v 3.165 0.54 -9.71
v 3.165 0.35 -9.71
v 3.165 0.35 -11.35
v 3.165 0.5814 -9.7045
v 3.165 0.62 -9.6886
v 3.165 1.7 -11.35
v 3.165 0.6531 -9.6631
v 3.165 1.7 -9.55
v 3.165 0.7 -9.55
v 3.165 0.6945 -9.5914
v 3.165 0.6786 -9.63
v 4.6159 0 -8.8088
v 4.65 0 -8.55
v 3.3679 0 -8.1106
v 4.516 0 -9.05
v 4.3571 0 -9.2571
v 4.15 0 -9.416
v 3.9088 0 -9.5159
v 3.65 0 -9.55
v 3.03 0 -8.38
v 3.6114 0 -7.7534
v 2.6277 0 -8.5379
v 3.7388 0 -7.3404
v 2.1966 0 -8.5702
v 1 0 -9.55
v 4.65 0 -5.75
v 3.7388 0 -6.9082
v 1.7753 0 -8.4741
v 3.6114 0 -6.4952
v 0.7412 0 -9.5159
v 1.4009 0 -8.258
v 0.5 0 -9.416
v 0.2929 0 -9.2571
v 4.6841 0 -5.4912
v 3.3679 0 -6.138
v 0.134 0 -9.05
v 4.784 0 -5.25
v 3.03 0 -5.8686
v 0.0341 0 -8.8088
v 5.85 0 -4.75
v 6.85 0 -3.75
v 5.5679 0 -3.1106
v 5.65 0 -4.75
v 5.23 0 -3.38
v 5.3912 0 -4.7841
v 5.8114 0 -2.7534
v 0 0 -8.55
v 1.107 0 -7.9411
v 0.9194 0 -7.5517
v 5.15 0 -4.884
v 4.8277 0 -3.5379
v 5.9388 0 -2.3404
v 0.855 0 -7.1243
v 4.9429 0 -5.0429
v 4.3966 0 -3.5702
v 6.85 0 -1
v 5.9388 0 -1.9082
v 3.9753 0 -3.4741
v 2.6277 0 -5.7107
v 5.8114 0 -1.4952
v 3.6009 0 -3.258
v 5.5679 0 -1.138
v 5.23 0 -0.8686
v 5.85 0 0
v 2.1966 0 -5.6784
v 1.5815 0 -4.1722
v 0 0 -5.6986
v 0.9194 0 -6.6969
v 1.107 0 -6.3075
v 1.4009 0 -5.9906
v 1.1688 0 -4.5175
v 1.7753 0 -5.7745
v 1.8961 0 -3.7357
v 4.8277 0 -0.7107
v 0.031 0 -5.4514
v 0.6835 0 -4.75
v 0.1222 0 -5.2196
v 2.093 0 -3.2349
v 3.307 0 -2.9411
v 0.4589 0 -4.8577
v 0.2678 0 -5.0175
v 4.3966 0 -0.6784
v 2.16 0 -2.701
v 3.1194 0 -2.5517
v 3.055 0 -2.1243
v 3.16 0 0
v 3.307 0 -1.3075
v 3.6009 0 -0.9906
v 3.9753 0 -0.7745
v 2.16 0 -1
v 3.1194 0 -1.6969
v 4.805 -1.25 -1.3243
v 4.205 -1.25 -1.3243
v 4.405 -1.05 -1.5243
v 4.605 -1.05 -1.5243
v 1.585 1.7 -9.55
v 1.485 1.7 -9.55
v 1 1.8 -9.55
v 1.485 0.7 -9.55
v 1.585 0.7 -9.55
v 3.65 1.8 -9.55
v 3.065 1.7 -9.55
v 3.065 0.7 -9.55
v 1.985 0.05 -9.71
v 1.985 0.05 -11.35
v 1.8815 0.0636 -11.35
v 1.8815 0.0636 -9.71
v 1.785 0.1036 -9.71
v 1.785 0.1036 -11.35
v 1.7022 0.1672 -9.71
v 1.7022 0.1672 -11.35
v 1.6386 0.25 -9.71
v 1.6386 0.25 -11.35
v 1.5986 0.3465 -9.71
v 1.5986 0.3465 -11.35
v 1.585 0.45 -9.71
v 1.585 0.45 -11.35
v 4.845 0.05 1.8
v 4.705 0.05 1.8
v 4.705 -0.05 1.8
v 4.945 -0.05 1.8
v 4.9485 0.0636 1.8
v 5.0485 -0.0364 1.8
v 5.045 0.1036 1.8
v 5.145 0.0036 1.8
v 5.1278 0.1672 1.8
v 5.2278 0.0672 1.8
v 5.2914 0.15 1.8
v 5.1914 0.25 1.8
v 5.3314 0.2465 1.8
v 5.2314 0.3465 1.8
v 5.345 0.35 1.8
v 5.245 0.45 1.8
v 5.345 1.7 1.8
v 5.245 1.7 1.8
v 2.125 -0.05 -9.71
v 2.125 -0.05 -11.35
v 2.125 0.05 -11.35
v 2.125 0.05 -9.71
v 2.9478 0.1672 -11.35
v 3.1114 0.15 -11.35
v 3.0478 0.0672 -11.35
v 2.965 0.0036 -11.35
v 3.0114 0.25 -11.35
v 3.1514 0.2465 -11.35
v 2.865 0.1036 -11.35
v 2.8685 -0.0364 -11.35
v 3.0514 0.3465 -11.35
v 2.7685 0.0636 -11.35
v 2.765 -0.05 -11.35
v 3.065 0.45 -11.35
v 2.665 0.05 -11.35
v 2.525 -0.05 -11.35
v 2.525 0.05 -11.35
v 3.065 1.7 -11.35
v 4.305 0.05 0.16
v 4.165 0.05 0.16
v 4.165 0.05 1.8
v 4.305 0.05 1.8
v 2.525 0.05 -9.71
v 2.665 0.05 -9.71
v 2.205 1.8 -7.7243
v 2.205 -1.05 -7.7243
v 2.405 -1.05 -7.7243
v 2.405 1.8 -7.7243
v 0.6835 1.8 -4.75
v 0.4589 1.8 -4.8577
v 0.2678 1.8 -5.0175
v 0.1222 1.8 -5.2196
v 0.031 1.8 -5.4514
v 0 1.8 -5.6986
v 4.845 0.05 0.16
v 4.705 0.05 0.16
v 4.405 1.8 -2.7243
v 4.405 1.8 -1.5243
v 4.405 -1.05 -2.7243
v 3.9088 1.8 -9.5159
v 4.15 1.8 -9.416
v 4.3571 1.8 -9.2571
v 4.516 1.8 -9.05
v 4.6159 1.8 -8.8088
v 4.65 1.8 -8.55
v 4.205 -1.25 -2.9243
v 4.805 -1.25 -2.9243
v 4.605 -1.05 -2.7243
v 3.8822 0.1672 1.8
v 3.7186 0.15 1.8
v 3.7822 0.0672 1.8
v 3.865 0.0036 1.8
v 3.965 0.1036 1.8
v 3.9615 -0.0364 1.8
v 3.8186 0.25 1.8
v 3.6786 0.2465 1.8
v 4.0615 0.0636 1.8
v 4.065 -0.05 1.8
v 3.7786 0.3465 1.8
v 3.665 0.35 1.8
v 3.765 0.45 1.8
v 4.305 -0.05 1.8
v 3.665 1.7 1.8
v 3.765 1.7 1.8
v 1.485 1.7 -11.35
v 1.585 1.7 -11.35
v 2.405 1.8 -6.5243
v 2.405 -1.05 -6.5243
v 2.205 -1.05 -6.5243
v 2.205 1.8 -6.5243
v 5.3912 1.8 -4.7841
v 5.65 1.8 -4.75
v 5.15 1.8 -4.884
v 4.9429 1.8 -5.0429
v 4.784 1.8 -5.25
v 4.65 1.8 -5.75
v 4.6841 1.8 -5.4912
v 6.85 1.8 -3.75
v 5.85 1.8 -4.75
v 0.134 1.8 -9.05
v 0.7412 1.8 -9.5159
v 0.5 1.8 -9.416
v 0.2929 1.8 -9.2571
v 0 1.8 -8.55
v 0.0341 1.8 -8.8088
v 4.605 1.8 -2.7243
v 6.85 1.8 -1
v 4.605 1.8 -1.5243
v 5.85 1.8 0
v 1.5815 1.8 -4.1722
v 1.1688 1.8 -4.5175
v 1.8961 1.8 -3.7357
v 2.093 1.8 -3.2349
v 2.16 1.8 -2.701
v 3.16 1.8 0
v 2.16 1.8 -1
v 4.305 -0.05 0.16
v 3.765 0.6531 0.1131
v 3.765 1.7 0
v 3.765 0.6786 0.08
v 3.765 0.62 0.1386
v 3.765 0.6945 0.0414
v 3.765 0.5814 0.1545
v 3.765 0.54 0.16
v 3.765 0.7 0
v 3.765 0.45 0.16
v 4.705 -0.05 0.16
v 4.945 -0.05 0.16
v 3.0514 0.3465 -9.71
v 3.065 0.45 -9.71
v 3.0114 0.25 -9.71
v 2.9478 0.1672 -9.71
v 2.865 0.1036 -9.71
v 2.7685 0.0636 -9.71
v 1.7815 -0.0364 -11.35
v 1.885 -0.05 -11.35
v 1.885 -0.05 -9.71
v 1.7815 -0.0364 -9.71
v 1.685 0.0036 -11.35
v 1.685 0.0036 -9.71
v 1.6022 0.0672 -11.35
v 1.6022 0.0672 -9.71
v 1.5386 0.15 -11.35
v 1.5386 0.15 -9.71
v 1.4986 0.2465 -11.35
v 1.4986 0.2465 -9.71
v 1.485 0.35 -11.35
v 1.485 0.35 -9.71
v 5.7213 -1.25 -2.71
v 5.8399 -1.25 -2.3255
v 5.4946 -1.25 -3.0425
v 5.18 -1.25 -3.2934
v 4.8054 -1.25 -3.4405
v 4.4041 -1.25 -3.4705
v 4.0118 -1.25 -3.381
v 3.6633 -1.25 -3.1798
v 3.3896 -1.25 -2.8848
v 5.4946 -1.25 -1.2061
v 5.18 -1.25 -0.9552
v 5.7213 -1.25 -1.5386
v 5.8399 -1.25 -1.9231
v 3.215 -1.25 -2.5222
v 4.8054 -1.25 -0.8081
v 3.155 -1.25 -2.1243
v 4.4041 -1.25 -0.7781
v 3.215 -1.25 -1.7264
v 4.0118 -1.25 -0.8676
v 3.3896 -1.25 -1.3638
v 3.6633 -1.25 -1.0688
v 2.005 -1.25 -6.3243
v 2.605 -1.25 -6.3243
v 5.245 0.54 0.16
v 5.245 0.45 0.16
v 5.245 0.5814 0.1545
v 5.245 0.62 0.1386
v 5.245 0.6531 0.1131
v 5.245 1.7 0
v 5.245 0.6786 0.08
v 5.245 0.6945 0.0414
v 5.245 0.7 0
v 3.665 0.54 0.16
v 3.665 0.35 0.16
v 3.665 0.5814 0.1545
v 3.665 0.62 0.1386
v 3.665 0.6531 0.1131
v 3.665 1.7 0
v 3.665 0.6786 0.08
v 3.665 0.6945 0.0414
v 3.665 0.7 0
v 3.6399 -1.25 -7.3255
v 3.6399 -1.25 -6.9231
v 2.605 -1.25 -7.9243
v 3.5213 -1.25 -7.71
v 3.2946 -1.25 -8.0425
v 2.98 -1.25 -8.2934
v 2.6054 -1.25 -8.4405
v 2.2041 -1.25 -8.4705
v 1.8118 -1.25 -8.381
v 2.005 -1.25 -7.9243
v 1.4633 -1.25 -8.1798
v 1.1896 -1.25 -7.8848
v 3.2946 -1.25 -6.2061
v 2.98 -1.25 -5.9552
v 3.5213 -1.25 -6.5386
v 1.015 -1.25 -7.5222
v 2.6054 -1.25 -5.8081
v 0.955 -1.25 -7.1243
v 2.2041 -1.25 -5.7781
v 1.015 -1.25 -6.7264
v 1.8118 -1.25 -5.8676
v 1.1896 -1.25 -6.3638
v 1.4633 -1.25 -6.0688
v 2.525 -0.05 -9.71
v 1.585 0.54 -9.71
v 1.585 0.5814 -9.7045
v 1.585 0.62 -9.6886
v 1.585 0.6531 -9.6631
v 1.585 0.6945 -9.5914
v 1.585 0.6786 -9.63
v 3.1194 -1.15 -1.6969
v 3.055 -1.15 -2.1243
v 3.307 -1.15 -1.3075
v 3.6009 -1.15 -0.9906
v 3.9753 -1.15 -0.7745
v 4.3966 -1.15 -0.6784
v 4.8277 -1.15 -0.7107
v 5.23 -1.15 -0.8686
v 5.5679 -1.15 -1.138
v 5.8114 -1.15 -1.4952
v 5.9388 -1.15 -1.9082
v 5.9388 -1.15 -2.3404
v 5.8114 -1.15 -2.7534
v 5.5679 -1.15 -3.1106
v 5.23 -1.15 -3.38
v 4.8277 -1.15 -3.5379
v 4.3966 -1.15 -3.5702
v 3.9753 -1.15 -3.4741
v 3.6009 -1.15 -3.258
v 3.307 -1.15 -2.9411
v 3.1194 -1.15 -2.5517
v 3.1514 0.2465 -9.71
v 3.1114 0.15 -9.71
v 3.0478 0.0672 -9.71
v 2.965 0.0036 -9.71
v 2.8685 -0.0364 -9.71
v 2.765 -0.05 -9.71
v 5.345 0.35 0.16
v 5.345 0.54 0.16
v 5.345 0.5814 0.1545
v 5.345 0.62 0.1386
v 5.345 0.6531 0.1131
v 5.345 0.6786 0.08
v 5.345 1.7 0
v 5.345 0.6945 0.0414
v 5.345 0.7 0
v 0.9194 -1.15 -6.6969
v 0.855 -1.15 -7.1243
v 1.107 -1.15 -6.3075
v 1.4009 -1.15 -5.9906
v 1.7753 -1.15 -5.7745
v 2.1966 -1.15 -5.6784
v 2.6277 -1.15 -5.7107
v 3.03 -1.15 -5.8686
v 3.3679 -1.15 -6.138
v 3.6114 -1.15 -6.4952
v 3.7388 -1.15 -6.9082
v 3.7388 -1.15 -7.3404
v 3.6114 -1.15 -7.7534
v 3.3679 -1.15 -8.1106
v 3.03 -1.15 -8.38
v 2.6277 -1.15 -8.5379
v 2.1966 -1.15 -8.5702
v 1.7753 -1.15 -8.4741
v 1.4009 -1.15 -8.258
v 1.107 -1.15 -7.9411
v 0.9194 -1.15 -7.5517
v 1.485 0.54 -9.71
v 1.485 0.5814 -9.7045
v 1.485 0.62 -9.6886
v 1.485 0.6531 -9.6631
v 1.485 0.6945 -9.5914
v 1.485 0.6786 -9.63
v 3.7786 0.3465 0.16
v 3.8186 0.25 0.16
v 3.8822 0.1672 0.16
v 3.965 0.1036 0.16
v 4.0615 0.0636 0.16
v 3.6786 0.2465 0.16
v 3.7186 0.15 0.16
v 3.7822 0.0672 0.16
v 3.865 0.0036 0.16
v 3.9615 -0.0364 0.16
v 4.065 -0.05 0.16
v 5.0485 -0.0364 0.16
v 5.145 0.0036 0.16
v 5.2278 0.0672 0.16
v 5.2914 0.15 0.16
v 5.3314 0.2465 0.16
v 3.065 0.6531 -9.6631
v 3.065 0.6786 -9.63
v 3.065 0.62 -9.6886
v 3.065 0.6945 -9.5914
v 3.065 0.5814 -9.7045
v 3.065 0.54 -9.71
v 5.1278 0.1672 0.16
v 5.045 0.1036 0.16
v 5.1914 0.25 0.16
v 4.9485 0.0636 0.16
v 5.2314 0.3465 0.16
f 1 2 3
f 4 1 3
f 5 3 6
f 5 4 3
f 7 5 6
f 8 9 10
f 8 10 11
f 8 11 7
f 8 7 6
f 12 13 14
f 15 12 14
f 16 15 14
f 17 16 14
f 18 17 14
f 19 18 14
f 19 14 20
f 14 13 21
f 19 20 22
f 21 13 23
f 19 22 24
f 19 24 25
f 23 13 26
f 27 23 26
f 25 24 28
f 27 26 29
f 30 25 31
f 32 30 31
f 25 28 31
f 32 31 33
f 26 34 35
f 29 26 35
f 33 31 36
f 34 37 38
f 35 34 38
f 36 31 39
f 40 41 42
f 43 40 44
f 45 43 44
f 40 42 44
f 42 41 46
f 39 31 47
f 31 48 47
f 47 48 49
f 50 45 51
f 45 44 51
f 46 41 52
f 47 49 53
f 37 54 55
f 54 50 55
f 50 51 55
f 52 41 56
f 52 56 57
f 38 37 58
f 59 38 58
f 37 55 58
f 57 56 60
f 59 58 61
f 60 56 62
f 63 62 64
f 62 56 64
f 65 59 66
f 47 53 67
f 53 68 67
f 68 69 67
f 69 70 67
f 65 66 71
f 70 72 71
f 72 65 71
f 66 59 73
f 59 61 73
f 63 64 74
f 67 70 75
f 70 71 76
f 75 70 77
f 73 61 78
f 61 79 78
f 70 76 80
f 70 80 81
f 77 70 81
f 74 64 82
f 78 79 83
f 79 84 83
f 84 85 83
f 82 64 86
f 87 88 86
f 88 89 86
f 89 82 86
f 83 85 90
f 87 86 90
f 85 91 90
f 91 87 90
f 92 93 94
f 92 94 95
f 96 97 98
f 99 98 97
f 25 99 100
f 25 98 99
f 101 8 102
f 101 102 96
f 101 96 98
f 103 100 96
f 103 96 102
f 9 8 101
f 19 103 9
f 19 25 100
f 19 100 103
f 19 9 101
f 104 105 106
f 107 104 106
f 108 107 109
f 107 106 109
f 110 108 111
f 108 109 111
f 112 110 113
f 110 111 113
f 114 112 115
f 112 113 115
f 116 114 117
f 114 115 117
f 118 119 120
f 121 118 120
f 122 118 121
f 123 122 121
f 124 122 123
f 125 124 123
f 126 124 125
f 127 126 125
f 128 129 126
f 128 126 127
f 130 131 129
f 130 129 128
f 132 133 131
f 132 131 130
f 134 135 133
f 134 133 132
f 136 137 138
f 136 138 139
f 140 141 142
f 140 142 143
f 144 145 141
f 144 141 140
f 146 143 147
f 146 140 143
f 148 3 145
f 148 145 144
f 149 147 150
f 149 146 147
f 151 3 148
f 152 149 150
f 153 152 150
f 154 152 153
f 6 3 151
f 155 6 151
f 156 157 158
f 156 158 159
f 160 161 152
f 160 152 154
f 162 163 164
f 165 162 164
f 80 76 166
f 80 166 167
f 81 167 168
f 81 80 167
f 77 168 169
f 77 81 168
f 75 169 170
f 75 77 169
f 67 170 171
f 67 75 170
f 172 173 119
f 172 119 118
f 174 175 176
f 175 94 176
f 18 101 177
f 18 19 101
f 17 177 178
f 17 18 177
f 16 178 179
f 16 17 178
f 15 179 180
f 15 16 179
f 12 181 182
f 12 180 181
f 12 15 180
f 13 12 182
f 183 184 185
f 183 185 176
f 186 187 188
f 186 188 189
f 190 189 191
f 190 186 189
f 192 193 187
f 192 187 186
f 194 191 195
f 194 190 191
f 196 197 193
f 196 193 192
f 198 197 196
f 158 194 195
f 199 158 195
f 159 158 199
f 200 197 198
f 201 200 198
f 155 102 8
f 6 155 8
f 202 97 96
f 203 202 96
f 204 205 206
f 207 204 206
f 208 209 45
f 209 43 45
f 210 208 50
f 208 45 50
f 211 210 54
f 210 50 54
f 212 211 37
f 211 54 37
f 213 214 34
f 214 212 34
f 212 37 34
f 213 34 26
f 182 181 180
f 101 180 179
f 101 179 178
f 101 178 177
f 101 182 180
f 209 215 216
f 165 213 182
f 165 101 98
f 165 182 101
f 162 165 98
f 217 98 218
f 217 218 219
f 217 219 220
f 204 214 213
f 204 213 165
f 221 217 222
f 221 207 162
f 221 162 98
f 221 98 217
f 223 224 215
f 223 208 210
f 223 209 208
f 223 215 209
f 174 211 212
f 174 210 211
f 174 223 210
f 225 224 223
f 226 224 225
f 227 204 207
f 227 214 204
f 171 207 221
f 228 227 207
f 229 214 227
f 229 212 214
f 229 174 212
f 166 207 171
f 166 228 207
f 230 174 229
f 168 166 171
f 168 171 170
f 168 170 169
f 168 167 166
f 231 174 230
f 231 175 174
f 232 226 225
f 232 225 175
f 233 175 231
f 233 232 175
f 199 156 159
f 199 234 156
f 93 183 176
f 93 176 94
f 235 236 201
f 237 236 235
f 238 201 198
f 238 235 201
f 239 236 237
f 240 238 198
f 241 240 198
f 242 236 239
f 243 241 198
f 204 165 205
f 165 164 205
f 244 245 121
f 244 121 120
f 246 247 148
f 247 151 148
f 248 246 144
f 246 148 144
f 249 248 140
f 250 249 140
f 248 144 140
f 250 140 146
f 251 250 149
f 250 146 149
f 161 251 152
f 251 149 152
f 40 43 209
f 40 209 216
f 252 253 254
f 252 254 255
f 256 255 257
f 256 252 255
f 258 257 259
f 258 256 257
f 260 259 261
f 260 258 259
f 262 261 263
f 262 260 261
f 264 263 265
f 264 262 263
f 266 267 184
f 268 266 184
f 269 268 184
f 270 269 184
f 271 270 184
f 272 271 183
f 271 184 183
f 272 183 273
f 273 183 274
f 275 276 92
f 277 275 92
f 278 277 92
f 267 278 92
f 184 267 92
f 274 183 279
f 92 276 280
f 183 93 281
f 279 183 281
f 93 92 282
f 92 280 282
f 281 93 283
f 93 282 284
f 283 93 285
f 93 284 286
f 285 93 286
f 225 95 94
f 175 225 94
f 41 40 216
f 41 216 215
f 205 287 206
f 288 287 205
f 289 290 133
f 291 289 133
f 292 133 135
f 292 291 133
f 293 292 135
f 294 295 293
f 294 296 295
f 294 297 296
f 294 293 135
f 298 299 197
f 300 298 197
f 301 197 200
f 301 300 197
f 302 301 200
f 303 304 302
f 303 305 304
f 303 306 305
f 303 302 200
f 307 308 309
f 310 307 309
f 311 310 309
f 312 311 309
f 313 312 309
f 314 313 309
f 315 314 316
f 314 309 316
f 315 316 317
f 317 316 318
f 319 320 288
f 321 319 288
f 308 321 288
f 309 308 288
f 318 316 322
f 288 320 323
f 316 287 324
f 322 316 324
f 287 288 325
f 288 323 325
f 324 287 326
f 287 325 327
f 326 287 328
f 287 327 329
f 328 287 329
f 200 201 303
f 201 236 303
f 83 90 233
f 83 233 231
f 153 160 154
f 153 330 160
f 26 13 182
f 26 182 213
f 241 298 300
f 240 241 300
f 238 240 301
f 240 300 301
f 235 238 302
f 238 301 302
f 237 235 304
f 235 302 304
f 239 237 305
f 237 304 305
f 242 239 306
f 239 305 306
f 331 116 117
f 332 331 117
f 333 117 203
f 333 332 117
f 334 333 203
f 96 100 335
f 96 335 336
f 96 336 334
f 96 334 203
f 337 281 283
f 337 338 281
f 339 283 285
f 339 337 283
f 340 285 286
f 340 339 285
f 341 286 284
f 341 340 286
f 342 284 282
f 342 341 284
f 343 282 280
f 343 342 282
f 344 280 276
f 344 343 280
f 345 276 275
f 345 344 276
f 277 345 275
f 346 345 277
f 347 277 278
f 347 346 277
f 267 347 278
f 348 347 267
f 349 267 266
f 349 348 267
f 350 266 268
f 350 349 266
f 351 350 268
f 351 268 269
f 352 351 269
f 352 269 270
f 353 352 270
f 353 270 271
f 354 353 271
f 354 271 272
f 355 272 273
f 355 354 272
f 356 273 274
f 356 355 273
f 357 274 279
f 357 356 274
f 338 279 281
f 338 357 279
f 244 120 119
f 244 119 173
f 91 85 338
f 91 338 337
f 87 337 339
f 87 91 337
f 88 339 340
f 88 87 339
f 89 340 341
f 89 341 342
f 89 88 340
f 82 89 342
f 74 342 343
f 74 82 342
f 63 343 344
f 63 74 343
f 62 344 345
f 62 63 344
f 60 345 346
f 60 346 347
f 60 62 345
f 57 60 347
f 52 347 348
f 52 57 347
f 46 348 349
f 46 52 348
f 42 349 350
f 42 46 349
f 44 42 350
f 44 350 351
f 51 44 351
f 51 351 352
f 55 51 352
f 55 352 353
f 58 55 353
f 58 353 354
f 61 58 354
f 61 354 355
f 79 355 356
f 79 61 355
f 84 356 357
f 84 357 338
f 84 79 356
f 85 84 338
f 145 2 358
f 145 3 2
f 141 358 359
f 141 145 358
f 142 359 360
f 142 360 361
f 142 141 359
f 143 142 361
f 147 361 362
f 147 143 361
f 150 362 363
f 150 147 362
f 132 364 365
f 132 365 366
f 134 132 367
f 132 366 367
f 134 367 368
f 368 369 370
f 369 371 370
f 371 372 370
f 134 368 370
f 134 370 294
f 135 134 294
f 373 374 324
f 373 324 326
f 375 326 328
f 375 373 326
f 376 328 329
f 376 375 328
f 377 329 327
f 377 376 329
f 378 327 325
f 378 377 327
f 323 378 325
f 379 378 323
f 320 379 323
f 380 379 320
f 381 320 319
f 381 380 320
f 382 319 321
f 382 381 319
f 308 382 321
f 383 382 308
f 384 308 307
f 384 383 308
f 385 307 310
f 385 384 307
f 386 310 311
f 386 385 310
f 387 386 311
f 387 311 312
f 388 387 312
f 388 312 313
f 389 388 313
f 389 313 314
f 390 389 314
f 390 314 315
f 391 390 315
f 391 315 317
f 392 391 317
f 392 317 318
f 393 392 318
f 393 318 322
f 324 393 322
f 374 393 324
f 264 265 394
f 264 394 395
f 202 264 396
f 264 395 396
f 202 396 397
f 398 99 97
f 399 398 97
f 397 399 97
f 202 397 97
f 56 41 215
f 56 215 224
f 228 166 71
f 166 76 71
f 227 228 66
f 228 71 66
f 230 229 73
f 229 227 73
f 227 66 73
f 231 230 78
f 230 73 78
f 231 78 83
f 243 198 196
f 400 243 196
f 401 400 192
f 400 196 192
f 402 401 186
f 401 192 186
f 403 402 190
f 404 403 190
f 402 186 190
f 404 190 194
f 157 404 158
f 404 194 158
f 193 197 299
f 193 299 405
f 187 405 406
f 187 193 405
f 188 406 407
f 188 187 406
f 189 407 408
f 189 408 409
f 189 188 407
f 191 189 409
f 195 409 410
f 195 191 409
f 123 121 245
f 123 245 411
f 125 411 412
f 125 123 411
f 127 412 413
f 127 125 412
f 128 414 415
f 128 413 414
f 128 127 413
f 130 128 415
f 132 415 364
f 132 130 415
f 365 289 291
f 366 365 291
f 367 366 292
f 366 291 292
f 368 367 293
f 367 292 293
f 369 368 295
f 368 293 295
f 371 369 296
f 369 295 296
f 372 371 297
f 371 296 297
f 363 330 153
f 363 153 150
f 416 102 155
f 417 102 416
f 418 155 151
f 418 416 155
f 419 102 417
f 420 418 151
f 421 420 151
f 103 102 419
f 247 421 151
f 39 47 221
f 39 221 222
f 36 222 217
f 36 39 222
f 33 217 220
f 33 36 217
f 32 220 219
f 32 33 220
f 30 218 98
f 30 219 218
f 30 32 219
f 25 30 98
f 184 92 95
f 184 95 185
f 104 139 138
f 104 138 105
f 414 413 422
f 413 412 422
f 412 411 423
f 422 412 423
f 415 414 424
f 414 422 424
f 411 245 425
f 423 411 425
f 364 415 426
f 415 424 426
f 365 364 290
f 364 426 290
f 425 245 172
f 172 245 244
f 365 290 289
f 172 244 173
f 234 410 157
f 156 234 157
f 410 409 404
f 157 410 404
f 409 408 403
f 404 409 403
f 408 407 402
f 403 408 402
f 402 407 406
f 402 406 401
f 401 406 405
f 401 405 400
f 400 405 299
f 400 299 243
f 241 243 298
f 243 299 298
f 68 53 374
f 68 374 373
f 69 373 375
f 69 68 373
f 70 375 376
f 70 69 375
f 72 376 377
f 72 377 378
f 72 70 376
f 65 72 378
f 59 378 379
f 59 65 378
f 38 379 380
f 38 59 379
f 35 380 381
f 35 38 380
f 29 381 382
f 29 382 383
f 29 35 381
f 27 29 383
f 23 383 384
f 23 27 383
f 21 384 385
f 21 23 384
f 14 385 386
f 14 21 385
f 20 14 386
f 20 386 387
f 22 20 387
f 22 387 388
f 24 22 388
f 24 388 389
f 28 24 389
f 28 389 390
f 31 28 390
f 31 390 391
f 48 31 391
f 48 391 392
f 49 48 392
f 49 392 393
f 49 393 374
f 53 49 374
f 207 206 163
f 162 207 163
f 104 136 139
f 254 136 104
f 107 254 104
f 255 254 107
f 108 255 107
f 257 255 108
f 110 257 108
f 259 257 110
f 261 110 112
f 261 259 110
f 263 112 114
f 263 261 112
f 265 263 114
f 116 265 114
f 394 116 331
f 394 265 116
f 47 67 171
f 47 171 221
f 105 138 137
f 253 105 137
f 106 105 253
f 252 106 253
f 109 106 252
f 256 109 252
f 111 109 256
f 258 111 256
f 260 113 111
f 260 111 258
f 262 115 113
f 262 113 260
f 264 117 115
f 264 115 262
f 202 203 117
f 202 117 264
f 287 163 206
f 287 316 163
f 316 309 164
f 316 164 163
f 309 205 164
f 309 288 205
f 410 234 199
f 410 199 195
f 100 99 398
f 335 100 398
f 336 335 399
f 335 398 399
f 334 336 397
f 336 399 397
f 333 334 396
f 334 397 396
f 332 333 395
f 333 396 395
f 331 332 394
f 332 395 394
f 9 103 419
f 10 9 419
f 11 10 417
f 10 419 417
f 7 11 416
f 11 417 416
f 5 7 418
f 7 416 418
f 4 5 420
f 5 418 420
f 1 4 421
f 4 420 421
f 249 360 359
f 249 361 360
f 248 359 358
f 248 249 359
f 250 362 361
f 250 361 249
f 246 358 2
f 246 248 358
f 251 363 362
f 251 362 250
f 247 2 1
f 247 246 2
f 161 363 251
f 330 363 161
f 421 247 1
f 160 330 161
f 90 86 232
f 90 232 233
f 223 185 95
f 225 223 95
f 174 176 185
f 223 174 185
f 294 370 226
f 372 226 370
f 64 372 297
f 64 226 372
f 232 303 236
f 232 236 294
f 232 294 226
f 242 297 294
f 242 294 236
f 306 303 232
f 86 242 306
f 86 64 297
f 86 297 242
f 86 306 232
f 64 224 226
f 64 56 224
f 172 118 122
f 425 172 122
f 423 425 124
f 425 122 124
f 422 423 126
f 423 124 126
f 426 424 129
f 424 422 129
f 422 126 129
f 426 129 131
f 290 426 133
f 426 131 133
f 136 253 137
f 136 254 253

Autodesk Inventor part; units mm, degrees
ref_plane "YZ Plane" through (0, 0, 0) normal (1, 0, 0) x (0, 1, 0)
ref_plane "XZ Plane" through (0, 0, 0) normal (0, 1, 0) x (-1, 0, 0)
ref_plane "XY Plane" through (0, 0, 0) normal (0, 0, 1) x (1, 0, 0)
sketch "Sketch1" plane through (0, 0, 0) normal (0, 1, 0) x (-1, 0, 0)
  line L0 (0, 0) -> (-3.16, 0)
  line L1 (-3.16, 0) -> (-2.16, -1)
  line L2 (-2.16, -1) -> (-2.16, -2.701)
  arc A0 (-2.16, -2.701) -> (-0.6835, -4.75) centre (0, -2.701) ccw
  line L3 (0, -5.6986) -> (0, -8.55)
  line L4 (-1, -9.55) -> (-3.65, -9.55)
  line L5 (-4.65, -8.55) -> (-4.65, -5.75)
  line L6 (-5.65, -4.75) -> (-5.85, -4.75)
  line L7 (-5.85, -4.75) -> (-6.85, -3.75)
  line L8 (-6.85, -3.75) -> (-6.85, -1)
  line L9 (-6.85, -1) -> (-5.85, 0)
  line L10 (-5.85, 0) -> (-3.16, 0)
  circle A1 centre (-4.505, -2.1243) radius 1.45
  circle A2 centre (-2.305, -7.1243) radius 1.45
  arc A3 (0, -5.6986) -> (-0.6835, -4.75) centre (-1, -5.6986) ccw
  arc A4 (-4.65, -5.75) -> (-5.65, -4.75) centre (-5.65, -5.75) ccw
  arc A5 (-1, -9.55) -> (0, -8.55) centre (-1, -8.55) ccw
  arc A6 (-4.65, -8.55) -> (-3.65, -9.55) centre (-3.65, -8.55) ccw
  point P0 (0, -4.861)
  point P1 (-4.65, -7.15)
  point P2 (-4.505, 0)
  point P3 (-5.75, -4.75)
  point P4 (0, -7.1243)
  dimension "d0" = 5
  dimension "d1" = 2.2
  dimension "d2" = 2.9
  dimension "d3" = 4.75
  dimension "d4" = 4.65
  dimension "d6" = 4.69
  dimension "d8" = 6.85
  dimension "d9" = 9.55
  dimension "d10" = 135
  dimension "d11" = 135
  dimension "d12" = 135
  dimension "d13" = 1
  dimension "d14" = 1
  dimension "d70" = 2.75
extrude "Extrusion1" add sketch "Sketch1" along normal blind 1.8 contours L1 L2 A0 A3 L3 A5 L4 A6 L5 A4 L6 L7 L8 L9 L10 | A1 | A2
extrude "Extrusion2" add sketch "Sketch1" against normal blind 1.25 contours A1 | A2
chamfer "Chamfer1" distance 0.1 angle 45 2 edges at (5.955, -1.25, -2.1243) (3.755, -1.25, -7.1243)
sketch "Sketch2" plane through (3.16, 0, 0) normal (0, 0, 1) x (1, 0, 0)
  line L0 (1.49, 1.8) -> (2.49, 1.8) projected
  line L1 (2.185, -0.05) -> (0.505, -0.05)
  line L2 (0.49, 0) -> (0.49, 1.8) projected
  line L3 (2.69, 0) -> (2.69, 1.8) projected
  line L4 (0, 0) -> (0, 1.8) projected
  line L5 (0, 1.8) -> (2.69, 1.8) projected
  line L6 (2.185, -0.05) -> (2.185, 1.7)
  line L7 (0.505, -0.05) -> (0.505, 1.7)
  line L8 (0.605, 1.7) -> (0.605, 0.05)
  line L9 (0.605, 0.05) -> (2.085, 0.05)
  line L10 (2.085, 0.05) -> (2.085, 1.7)
  line L11 (2.185, 1.7) -> (2.085, 1.7)
  line L12 (0.605, 1.7) -> (0.505, 1.7)
  point P0 (-3.16, 0)
  dimension "d24" = 1.68
  dimension "d26" = 1.85
  dimension "d27" = 0.1
  dimension "d28" = 0.505
  dimension "d29" = 0.505
  dimension "d30" = 0.1
  dimension "d31" = 0.1
extrude "Extrusion3" add sketch "Sketch2" along normal blind 1.8
sketch "Sketch3" plane through (3.665, 0, 0) normal (-1, 0, 0) x (0, 0, 1)
  line L0 (0, -0.05) -> (1.8, -0.05) projected
  line L1 (0.16, -0.05) -> (0.16, 0.54)
  line L2 (0, 0) -> (0, 1.7) projected
  arc A0 (0.16, 0.54) -> (0, 0.7) centre (0, 0.54) ccw
  line L3 (0, 0) -> (0, 1.8) projected
  line L4 (0, 0) -> (0, 1.7) projected
  line L5 (0, 0) -> (0, -0.05) projected
  line L6 (0, -0.05) -> (1.8, -0.05) projected
  line L7 (1.8, 1.7) -> (1.8, -0.05) projected
  line L8 (0, 1.7) -> (1.8, 1.7) projected
  point P0 (0, 0)
  point P1 (0, -0.05)
  dimension "d34" = 0.16
  dimension "d54" = 0.75
extrude "Extrusion4" cut sketch "Sketch3" against normal through all contours L5 L2 A0 L1 L0
sketch "Sketch4" plane through (3.65, 0, -9.55) normal (0, 0, -1) x (-1, 0, 0)
  line L0 (2.165, -0.05) -> (0.485, -0.05)
  line L1 (2.165, -0.05) -> (2.165, 1.7)
  line L2 (0.485, -0.05) -> (0.485, 1.7)
  line L3 (0.585, 1.7) -> (0.585, 0.05)
  line L4 (0.585, 0.05) -> (2.065, 0.05)
  line L5 (2.065, 0.05) -> (2.065, 1.7)
  line L6 (2.165, 1.7) -> (2.065, 1.7)
  line L7 (0.585, 1.7) -> (0.485, 1.7)
  line L8 (2.65, 0) -> (2.65, 1.8) projected
  line L9 (0, 1.8) -> (2.65, 1.8) projected
  line L10 (0, 0) -> (0, 1.8) projected
  point P0 (3.65, 0)
  dimension "d37" = 1.68
  dimension "d42" = 0.1
  dimension "d43" = 0.1
  dimension "d44" = 0.485
  dimension "d45" = 0.485
  dimension "d46" = 1.85
  dimension "d47" = 0.1
extrude "Extrusion5" add sketch "Sketch4" along normal blind 1.8
sketch "Sketch5" plane through (1.485, 0, -9.55) normal (-1, 0, 0) x (0, 0, 1)
  line L0 (0, -0.05) -> (0, 0) projected
  line L1 (0, 1.7) -> (0, 0) projected
  line L2 (0, 1.7) -> (-1.8, 1.7) projected
  line L3 (-1.8, -0.05) -> (-1.8, 1.7) projected
  line L4 (0, -0.05) -> (-1.8, -0.05) projected
  line L5 (-0.16, -0.05) -> (-0.16, 0.54)
  arc A0 (0, 0.7) -> (-0.16, 0.54) centre (0, 0.54) ccw
  point P0 (9.55, 0)
  point P1 (-1.867, -0.613)
  point P2 (-1.867, -0.6608)
  point P3 (0, -0.025)
  dimension "d51" = 0.16
  dimension "d55" = 0.75
extrude "Extrusion6" cut sketch "Sketch5" against normal through all contours L4 L5 A0 L1 L0
sketch "Sketch6" plane through (4.505, -1.25, -2.1243) normal (0, -1, 0) x (1, 0, 0)
  line L0 (0.1, 0.6) -> (-0.1, 0.6)
  line L1 (-0.1, 0.6) -> (-0.1, -0.6)
  line L2 (-0.1, -0.6) -> (0.1, -0.6)
  line L3 (0.1, -0.6) -> (0.1, 0.6)
  line L4 (-2.1, -4.4) -> (-2.3, -4.4)
  line L5 (-2.3, -4.4) -> (-2.3, -5.6)
  line L6 (-2.3, -5.6) -> (-2.1, -5.6)
  line L7 (-2.1, -5.6) -> (-2.1, -4.4)
  circle A0 centre (0, 0) radius 1.35 projected
  circle A1 centre (-2.2, -5) radius 1.35 projected
  point P0 (-4.505, 2.1243)
  point P1 (0.1, 0)
  point P2 (0, 0.6)
  point P3 (-2.1, -5)
  point P4 (-2.2, -4.4)
  dimension "d56" = 1.2
  dimension "d57" = 0.2
  dimension "d58" = 1.2
  dimension "d59" = 0.2
extrude "Extrusion7" cut sketch "Sketch6" against normal through all contours L3 L2 L1 L0 | L7 L6 L5 L4
chamfer "Chamfer2" distance 0.2 angle 45 8 edges at (4.605, -1.25, -2.1243) (4.505, -1.25, -1.5243) (4.405, -1.25, -2.1243) (4.505, -1.25, -2.7243) (2.405, -1.25, -7.1243) (2.305, -1.25, -6.5243) (2.205, -1.25, -7.1243) (2.305, -1.25, -7.7243)
fillet "Fillet1" radius 0.4 8 edges at (3.665, -0.05, 0.98) (5.345, -0.05, 0.98) (5.245, 0.05, 0.98) (3.765, 0.05, 0.98) (1.485, -0.05, -10.53) (3.165, -0.05, -10.53) (3.065, 0.05, -10.53) (1.585, 0.05, -10.53)
sketch "Sketch7" plane through (4.065, -0.05, 1.8) normal (0, -1, 0) x (1, 0, 0)
  line L0 (0.24, 0) -> (0.64, 0)
  line L1 (0.64, 0) -> (0.64, -1.64)
  line L2 (0.64, -1.64) -> (0.24, -1.64)
  line L3 (0.24, -1.64) -> (0.24, 0)
  line L4 (0, 0) -> (0.88, 0) projected
  line L5 (-1.94, -11.51) -> (-1.54, -11.51)
  line L6 (-1.54, -11.51) -> (-1.54, -13.15)
  line L7 (-1.54, -13.15) -> (-1.94, -13.15)
  line L8 (-1.94, -13.15) -> (-1.94, -11.51)
  line L9 (-1.3, -11.51) -> (-2.18, -11.51) projected
  line L10 (-1.3, -13.15) -> (-2.18, -13.15) projected
  line L11 (0, -1.64) -> (0.88, -1.64) projected
  point P0 (-4.065, -1.8)
  point P1 (0.44, 0)
  point P2 (0.44, 0)
  point P3 (-1.74, -11.51)
  point P4 (-1.74, -11.51)
  dimension "d66" = 0.4
  dimension "d67" = 0.4
extrude "Extrusion8" cut sketch "Sketch7" against normal through all
equation "\"d11\" = d10"
equation "\"d29\" = d28"
properties part number "Kailh Choc Hotswap Socket"
